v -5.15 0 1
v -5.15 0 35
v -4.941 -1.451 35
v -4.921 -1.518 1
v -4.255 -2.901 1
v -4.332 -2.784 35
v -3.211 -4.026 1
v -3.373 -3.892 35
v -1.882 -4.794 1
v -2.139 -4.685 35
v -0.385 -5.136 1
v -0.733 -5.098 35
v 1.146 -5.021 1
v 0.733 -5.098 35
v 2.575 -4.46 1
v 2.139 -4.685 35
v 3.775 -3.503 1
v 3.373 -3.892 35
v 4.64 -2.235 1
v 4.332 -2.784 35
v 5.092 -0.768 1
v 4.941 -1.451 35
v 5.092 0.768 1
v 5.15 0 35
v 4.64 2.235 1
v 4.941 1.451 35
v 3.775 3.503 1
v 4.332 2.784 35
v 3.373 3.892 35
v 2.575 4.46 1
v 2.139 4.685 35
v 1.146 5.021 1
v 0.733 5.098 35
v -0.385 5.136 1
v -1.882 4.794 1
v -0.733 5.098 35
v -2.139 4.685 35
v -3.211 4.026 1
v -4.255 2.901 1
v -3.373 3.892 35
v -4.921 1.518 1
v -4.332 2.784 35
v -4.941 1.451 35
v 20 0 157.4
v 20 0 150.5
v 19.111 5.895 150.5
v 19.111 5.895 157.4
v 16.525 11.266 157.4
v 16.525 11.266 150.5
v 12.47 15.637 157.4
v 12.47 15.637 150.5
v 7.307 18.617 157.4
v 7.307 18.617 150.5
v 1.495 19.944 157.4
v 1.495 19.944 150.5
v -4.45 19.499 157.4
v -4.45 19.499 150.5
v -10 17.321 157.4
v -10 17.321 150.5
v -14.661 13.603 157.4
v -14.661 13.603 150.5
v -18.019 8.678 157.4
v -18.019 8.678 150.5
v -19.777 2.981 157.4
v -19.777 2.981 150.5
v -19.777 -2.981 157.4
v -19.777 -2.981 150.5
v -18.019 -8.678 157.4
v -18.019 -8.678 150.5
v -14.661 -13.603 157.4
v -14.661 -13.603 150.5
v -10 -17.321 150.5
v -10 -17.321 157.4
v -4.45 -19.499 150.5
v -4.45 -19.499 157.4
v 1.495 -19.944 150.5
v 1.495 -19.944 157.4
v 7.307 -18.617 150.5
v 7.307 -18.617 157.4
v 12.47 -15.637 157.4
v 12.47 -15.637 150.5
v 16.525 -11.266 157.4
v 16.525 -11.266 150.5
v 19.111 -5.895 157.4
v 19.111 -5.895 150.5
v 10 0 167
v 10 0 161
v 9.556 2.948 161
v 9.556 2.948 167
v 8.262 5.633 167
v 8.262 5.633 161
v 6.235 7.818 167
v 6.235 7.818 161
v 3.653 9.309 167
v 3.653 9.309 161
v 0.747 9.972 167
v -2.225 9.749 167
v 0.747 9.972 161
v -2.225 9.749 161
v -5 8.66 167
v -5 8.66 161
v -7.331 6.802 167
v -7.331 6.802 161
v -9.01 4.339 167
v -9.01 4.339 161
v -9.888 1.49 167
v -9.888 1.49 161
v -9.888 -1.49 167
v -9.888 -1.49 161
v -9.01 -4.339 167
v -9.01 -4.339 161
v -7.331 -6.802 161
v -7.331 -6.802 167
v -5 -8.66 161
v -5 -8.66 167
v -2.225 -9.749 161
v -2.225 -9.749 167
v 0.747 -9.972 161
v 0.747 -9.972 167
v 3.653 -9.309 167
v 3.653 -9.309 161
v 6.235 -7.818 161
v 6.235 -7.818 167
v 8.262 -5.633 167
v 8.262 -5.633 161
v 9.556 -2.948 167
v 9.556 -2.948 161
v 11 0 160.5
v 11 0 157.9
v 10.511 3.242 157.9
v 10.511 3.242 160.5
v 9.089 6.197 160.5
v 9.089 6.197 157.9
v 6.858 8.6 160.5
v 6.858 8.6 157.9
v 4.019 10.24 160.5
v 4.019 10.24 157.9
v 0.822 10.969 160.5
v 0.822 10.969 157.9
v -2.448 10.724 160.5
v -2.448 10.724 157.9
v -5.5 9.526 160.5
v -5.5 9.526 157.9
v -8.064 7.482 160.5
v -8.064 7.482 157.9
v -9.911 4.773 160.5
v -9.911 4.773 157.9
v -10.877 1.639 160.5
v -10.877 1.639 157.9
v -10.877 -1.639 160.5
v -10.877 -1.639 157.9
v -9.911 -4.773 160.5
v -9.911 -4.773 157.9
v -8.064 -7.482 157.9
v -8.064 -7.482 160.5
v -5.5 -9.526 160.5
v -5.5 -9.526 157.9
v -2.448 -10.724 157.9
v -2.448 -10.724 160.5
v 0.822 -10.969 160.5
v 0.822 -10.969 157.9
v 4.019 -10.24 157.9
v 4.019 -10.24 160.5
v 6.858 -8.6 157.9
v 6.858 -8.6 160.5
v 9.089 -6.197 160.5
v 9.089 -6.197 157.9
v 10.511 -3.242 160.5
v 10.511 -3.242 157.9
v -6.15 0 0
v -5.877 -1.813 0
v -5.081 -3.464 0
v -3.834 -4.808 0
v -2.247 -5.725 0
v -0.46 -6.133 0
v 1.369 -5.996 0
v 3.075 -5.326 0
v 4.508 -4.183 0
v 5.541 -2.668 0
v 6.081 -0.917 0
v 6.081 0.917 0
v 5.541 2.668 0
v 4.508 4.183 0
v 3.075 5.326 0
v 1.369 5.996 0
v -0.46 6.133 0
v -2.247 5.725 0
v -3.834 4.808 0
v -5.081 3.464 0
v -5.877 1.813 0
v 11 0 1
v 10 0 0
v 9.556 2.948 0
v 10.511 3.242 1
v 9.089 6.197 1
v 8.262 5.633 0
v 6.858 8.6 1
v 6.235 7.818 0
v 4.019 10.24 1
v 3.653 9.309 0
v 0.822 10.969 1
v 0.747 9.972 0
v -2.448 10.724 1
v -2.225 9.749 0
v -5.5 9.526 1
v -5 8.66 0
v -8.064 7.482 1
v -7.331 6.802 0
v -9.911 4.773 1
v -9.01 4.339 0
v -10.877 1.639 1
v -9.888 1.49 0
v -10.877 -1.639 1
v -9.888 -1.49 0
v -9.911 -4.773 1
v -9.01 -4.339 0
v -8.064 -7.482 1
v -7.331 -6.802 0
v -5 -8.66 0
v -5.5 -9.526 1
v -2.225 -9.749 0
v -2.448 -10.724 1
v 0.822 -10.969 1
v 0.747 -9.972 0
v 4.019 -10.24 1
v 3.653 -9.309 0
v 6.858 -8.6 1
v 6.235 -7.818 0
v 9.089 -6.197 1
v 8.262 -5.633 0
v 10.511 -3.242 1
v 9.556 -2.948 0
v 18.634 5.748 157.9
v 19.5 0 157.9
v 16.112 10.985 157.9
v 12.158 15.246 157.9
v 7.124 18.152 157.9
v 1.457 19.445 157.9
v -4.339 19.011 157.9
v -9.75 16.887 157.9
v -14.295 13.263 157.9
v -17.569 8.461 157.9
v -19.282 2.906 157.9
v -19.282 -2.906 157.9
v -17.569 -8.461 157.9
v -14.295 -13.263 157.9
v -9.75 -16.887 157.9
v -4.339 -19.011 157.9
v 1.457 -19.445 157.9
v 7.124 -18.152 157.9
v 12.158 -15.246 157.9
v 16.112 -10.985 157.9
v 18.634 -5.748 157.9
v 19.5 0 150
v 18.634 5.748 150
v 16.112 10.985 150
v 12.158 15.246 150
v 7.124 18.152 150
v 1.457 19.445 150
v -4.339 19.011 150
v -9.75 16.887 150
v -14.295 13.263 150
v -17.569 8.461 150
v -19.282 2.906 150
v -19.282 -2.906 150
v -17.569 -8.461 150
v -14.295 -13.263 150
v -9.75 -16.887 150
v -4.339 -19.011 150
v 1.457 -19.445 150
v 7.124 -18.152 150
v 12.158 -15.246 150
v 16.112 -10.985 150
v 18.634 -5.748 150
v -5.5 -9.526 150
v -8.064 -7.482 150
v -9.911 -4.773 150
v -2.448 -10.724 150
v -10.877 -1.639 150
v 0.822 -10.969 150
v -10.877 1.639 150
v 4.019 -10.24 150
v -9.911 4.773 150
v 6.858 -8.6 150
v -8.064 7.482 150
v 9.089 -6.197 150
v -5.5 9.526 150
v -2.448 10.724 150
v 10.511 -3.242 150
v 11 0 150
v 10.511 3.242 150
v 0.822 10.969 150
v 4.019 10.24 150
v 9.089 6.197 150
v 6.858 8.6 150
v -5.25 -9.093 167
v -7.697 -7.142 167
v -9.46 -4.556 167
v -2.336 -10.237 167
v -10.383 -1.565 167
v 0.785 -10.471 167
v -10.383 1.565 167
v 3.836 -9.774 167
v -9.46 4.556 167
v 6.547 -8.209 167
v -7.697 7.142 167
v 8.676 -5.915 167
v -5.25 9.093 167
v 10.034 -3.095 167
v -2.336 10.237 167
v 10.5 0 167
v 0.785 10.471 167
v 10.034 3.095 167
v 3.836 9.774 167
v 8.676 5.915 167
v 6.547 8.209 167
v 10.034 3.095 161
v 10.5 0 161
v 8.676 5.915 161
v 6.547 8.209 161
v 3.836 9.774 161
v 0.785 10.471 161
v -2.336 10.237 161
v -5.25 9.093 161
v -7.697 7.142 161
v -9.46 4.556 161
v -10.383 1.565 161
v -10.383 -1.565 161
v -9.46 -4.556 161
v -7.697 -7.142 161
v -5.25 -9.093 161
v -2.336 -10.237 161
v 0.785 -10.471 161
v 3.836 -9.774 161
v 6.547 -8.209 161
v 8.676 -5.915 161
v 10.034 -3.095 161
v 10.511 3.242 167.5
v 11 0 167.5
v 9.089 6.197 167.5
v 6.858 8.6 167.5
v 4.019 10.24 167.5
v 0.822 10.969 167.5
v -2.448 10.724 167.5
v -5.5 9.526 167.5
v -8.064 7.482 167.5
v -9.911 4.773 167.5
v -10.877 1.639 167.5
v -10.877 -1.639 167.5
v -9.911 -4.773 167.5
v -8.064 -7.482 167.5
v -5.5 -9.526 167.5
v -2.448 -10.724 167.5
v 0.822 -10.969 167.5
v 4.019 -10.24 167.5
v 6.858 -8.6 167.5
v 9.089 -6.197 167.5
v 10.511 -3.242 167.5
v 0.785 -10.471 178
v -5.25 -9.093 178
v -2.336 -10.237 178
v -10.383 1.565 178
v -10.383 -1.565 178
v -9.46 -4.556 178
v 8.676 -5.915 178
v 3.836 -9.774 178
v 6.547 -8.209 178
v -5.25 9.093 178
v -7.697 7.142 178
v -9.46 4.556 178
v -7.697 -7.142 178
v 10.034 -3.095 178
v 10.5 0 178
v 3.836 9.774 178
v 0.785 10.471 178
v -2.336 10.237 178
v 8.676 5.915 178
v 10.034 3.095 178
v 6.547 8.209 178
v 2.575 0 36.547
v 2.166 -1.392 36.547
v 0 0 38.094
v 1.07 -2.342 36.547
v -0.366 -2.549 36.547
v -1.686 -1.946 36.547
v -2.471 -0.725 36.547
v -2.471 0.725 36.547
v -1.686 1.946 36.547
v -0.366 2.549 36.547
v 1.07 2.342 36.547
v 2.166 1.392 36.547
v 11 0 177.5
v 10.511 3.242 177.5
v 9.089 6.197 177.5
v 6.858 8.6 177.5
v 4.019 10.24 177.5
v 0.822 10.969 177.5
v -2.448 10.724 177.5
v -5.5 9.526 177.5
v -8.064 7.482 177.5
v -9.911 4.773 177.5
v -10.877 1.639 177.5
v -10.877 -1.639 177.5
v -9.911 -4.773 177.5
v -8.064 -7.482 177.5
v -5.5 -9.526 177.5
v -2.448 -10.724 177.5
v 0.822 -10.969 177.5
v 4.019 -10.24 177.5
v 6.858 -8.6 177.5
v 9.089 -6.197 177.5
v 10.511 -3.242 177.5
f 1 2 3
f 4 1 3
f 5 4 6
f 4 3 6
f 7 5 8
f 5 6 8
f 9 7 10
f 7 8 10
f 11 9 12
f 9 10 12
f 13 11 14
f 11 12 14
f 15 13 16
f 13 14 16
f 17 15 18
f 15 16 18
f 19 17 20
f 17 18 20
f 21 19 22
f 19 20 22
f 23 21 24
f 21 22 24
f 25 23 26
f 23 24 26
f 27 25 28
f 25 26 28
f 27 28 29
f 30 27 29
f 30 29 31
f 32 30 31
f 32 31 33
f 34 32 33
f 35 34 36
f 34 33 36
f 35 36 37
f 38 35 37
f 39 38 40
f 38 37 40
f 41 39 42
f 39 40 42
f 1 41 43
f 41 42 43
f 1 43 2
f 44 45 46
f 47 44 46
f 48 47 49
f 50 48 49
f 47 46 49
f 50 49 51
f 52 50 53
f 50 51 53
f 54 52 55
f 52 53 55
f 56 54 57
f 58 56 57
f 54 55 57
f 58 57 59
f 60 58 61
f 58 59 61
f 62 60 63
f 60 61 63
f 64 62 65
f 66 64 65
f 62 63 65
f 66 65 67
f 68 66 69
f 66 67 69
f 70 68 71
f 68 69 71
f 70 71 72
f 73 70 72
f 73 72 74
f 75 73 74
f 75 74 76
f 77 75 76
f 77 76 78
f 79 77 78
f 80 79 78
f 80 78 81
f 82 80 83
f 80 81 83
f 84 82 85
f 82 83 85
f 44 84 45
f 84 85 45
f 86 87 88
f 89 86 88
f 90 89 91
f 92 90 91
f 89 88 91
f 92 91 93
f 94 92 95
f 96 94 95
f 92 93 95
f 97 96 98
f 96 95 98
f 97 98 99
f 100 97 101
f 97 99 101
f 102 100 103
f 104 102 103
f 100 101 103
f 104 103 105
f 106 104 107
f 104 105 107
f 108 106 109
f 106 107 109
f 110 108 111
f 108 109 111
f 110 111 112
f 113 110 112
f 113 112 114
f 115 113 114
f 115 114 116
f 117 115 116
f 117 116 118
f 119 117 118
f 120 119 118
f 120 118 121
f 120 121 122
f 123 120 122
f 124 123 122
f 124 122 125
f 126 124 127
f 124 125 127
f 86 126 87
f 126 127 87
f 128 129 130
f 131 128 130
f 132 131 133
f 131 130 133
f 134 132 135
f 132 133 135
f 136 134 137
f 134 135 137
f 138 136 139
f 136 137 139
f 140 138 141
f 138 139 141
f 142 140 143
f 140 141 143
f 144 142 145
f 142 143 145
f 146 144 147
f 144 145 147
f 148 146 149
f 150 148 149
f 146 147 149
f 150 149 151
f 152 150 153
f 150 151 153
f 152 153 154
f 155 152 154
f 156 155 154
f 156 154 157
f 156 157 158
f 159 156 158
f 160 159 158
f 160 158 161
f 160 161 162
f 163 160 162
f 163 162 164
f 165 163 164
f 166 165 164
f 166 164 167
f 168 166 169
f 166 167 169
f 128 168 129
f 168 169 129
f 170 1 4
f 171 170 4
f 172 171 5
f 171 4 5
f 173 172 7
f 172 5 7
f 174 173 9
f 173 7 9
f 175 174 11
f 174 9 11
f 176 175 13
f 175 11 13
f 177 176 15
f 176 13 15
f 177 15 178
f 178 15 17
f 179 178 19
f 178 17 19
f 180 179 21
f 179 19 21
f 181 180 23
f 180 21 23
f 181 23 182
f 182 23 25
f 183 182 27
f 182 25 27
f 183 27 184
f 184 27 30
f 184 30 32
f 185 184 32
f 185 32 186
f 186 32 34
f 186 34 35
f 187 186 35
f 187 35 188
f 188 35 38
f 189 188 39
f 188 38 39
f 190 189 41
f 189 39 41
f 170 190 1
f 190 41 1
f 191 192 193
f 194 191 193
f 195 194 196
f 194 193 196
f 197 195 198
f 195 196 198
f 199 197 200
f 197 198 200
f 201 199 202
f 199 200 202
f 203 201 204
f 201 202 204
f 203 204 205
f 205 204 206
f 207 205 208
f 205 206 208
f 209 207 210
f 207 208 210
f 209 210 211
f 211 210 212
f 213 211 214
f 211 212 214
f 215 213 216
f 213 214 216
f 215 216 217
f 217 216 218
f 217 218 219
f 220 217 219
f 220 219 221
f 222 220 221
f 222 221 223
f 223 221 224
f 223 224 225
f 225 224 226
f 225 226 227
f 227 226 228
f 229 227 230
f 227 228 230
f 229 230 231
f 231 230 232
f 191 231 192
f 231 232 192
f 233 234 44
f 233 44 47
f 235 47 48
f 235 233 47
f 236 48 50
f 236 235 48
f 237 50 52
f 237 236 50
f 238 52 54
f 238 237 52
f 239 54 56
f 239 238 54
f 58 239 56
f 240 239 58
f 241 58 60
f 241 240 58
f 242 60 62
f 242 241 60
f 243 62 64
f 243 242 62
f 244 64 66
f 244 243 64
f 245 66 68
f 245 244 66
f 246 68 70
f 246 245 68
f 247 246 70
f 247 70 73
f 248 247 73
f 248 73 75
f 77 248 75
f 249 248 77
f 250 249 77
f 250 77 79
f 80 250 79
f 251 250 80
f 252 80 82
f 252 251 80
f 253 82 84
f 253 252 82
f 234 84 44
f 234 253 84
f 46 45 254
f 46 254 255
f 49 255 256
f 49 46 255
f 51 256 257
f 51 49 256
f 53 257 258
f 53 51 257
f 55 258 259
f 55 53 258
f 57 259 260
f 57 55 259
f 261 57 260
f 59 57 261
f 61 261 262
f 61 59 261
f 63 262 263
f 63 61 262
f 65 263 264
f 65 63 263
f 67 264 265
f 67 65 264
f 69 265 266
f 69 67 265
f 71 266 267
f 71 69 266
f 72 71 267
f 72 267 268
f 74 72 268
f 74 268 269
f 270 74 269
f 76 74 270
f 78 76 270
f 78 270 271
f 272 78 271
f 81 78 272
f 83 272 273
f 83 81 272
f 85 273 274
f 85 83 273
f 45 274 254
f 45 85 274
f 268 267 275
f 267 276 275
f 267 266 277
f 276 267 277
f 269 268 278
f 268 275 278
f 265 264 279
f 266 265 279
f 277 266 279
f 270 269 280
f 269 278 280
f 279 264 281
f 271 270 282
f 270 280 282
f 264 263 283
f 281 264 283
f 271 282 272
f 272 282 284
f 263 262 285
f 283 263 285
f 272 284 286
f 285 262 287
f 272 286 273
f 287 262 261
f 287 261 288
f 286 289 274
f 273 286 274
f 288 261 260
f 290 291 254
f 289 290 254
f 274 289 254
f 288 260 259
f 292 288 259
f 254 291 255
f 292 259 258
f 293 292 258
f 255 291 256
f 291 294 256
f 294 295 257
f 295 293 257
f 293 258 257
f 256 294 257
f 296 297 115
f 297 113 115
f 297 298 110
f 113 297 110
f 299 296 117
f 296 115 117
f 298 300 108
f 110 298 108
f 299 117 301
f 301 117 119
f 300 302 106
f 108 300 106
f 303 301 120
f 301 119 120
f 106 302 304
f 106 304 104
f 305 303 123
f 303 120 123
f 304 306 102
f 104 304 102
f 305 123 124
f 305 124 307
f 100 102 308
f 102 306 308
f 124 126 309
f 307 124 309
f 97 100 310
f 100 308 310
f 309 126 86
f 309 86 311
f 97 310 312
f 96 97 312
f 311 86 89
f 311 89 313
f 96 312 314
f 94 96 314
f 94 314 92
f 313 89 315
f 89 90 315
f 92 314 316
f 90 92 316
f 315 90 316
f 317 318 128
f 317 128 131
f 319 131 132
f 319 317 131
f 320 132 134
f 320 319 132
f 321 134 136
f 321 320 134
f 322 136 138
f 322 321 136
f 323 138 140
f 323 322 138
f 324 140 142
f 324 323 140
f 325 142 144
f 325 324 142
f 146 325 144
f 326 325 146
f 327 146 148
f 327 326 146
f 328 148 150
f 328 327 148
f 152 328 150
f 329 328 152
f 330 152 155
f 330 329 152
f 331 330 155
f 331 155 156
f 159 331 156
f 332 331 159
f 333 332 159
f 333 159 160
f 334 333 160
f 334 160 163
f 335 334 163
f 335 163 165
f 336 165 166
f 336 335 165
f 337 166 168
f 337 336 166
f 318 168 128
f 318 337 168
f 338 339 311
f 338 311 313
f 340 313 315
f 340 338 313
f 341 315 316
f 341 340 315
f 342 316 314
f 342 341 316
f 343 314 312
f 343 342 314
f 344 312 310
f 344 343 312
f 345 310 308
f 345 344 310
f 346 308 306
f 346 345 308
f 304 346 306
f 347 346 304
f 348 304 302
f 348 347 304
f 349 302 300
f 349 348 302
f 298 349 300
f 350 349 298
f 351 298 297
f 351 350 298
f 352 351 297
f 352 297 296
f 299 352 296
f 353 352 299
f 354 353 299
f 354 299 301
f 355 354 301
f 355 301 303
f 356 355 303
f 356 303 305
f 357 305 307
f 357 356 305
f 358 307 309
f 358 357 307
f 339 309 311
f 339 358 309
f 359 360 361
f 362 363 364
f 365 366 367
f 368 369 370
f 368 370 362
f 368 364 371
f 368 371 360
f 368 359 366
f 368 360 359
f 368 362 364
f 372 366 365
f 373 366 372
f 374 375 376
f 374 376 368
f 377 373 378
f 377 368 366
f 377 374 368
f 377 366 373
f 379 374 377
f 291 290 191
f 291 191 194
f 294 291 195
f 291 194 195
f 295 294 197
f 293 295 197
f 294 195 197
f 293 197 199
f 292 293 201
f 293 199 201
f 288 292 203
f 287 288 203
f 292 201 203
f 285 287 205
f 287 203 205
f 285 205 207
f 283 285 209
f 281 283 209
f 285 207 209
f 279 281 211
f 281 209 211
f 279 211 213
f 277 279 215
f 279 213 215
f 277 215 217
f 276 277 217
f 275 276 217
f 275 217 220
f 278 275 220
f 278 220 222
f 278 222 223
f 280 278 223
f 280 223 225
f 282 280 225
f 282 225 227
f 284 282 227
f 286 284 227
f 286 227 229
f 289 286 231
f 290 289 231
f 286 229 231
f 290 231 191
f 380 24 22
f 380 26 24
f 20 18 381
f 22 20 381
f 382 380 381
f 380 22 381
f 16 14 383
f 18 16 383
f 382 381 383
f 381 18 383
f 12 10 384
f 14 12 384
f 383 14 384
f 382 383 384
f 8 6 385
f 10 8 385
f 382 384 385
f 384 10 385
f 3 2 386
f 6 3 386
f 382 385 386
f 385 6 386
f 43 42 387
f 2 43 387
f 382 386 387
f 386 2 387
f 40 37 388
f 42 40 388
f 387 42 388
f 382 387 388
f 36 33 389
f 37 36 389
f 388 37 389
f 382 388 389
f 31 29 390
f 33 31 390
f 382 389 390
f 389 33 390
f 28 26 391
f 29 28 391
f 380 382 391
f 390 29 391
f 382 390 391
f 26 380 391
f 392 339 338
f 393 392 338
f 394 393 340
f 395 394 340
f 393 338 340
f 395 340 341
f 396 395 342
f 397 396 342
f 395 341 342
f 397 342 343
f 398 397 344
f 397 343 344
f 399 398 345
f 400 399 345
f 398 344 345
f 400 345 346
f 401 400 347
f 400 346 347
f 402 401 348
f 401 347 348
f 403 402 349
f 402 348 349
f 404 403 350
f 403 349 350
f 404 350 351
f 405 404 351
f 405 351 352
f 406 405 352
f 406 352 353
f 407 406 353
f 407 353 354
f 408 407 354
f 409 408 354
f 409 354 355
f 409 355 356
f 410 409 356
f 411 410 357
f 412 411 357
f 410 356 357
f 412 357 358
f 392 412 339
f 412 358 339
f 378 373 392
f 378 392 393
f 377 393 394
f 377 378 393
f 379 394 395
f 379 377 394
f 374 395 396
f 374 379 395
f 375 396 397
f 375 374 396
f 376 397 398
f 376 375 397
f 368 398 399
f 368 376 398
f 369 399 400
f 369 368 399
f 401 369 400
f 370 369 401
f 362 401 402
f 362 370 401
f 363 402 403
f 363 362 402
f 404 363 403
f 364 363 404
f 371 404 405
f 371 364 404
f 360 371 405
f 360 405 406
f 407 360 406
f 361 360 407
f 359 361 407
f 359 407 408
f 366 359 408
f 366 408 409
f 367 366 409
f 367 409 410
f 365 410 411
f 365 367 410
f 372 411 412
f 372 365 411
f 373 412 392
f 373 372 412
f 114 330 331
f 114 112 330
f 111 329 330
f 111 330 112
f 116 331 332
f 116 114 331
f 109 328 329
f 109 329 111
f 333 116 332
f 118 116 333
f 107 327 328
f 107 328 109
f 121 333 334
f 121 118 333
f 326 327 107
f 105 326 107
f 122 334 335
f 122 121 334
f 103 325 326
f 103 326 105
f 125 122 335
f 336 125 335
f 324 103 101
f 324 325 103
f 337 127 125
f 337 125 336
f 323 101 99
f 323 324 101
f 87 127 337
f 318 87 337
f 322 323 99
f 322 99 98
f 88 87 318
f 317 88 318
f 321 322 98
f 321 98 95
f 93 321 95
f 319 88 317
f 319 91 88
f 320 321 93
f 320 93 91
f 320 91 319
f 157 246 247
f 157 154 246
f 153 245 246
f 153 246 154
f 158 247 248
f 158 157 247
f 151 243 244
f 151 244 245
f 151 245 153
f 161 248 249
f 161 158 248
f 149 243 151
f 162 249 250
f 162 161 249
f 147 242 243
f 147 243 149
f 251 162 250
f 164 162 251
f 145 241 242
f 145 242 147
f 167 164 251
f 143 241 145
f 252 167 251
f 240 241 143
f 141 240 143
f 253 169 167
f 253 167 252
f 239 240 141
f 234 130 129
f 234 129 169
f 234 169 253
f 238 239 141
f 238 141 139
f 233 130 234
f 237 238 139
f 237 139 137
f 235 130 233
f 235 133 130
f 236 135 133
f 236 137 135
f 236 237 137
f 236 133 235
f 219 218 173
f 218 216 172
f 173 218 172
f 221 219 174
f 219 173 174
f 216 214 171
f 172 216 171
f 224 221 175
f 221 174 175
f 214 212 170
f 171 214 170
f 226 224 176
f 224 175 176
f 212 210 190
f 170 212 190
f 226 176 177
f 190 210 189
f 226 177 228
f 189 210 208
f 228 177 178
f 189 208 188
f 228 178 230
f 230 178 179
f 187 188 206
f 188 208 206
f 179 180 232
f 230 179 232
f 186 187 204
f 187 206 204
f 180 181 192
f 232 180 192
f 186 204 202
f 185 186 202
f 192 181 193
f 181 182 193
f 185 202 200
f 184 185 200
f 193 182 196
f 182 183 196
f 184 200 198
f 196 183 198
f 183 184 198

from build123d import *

# Parameters (mm, degrees)
F0_R      = 11
F1_DEPTH  = 150
F2_R      = 20
F3_DEPTH  = 7.9
F4_R      = 11
F5_DEPTH  = 3.1
F6_R      = 10
F7_DEPTH  = 6
F8_R      = 11
F9_DEPTH  = 11
F11_D     = 10.3
F11_DEPTH = 35
F11_TIP   = 3.094432188
F12_SIZE  = 1
F13_SIZE  = 0.5


with BuildPart() as f1:
    # F0 (on Top) → F1 (new body)
    with BuildSketch(Plane.XY):
        Circle(F0_R)
    extrude(amount=F1_DEPTH)

    # F2 (on face) → F3 (join)
    with BuildSketch(Plane.XY.offset(150)):
        Circle(F2_R)
    extrude(amount=F3_DEPTH)

    # F4 (on face) → F5 (join)
    with BuildSketch(Plane.XY.offset(157.9)):
        Circle(F4_R)
    extrude(amount=F5_DEPTH)

    # F6 (on face) → F7 (join)
    with BuildSketch(Plane.XY.offset(161)):
        Circle(F6_R)
    extrude(amount=F7_DEPTH)

    # F8 (on face) → F9 (join)
    with BuildSketch(Plane.XY.offset(167)):
        Circle(F8_R)
    extrude(amount=F9_DEPTH)

    # F11
    with Locations(Plane(origin=(0, 0, 0), x_dir=(1, 0, 0), z_dir=(0, 0, -1))):
        with Locations((0, 0)):
            Hole(F11_D / 2, depth=F11_DEPTH)
            with Locations((0, 0, -(F11_DEPTH + F11_TIP / 2))):  # 118° drill point
                Cone(0, F11_D / 2, F11_TIP, mode=Mode.SUBTRACT)

    # F12
    f12_edges = [f1.edges().sort_by_distance(p)[0] for p in [
        (-11, 0, 0),
        (-5.15, 0, 0),
    ]]
    chamfer(f12_edges, length=F12_SIZE)

    # F13
    f13_edges = [f1.edges().sort_by_distance(p)[0] for p in [
        (-20, 0, 150),
        (-20, 0, 157.9),
        (-11, 0, 161),
        (-11, 0, 167),
        (-11, 0, 178),
    ]]
    chamfer(f13_edges, length=F13_SIZE)


solid = f1.part
